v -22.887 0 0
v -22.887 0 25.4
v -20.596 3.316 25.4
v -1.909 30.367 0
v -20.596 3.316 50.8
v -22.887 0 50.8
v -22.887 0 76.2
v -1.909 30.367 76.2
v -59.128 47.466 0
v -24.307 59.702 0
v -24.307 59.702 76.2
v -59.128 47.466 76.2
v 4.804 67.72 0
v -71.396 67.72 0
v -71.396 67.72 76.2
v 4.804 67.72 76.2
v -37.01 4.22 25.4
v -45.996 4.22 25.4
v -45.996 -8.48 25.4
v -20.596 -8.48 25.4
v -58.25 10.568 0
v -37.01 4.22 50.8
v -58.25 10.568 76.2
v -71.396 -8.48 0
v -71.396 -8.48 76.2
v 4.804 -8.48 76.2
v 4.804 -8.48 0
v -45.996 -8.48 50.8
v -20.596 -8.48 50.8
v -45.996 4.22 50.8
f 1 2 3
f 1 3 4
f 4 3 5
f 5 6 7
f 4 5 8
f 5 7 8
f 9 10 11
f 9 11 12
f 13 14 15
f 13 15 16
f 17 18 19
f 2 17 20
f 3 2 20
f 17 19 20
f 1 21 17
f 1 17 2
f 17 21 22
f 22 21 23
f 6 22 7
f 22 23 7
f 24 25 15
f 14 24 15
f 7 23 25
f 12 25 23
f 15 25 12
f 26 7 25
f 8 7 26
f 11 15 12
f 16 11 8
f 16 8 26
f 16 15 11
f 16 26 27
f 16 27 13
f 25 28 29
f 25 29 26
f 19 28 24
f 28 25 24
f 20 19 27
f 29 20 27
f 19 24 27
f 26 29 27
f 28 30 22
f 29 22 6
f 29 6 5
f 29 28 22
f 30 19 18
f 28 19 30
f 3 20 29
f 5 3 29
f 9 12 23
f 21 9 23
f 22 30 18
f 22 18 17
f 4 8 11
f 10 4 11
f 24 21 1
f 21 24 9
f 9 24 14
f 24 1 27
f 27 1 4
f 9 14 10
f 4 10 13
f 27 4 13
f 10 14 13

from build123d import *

# Parameters (mm, degrees)
F0_W     = 76.2
F0_H     = 76.2
F1_DEPTH = 76.2
F3_DEPTH = 76.201
F4_W     = 25.4
F4_H     = 25.4
F5_DEPTH = 12.7


with BuildPart() as f1:
    # F0 (on Top) → F1 (new body)
    with BuildSketch(Plane.XY):
        with Locations((-33.296083, 29.620429)):
            Rectangle(F0_W, F0_H)
    extrude(amount=F1_DEPTH)

    # F2 (on face) → F3 (cut, through all)
    with BuildSketch(Plane.XY.offset(76.2)):
        Polygon((-22.887098, 0), (-1.908828, 30.366746), (-24.306678, 59.702107), (-59.12758, 47.465611), (-58.250232, 10.56768), align=None)
    extrude(amount=-F3_DEPTH, mode=Mode.SUBTRACT)

    # F4 (on face) → F5 (cut)
    with BuildSketch(Plane.XZ.offset(8.479571)):
        with Locations((-33.296083, 38.1)):
            Rectangle(F4_W, F4_H)
    extrude(amount=-F5_DEPTH, mode=Mode.SUBTRACT)


solid = f1.part
